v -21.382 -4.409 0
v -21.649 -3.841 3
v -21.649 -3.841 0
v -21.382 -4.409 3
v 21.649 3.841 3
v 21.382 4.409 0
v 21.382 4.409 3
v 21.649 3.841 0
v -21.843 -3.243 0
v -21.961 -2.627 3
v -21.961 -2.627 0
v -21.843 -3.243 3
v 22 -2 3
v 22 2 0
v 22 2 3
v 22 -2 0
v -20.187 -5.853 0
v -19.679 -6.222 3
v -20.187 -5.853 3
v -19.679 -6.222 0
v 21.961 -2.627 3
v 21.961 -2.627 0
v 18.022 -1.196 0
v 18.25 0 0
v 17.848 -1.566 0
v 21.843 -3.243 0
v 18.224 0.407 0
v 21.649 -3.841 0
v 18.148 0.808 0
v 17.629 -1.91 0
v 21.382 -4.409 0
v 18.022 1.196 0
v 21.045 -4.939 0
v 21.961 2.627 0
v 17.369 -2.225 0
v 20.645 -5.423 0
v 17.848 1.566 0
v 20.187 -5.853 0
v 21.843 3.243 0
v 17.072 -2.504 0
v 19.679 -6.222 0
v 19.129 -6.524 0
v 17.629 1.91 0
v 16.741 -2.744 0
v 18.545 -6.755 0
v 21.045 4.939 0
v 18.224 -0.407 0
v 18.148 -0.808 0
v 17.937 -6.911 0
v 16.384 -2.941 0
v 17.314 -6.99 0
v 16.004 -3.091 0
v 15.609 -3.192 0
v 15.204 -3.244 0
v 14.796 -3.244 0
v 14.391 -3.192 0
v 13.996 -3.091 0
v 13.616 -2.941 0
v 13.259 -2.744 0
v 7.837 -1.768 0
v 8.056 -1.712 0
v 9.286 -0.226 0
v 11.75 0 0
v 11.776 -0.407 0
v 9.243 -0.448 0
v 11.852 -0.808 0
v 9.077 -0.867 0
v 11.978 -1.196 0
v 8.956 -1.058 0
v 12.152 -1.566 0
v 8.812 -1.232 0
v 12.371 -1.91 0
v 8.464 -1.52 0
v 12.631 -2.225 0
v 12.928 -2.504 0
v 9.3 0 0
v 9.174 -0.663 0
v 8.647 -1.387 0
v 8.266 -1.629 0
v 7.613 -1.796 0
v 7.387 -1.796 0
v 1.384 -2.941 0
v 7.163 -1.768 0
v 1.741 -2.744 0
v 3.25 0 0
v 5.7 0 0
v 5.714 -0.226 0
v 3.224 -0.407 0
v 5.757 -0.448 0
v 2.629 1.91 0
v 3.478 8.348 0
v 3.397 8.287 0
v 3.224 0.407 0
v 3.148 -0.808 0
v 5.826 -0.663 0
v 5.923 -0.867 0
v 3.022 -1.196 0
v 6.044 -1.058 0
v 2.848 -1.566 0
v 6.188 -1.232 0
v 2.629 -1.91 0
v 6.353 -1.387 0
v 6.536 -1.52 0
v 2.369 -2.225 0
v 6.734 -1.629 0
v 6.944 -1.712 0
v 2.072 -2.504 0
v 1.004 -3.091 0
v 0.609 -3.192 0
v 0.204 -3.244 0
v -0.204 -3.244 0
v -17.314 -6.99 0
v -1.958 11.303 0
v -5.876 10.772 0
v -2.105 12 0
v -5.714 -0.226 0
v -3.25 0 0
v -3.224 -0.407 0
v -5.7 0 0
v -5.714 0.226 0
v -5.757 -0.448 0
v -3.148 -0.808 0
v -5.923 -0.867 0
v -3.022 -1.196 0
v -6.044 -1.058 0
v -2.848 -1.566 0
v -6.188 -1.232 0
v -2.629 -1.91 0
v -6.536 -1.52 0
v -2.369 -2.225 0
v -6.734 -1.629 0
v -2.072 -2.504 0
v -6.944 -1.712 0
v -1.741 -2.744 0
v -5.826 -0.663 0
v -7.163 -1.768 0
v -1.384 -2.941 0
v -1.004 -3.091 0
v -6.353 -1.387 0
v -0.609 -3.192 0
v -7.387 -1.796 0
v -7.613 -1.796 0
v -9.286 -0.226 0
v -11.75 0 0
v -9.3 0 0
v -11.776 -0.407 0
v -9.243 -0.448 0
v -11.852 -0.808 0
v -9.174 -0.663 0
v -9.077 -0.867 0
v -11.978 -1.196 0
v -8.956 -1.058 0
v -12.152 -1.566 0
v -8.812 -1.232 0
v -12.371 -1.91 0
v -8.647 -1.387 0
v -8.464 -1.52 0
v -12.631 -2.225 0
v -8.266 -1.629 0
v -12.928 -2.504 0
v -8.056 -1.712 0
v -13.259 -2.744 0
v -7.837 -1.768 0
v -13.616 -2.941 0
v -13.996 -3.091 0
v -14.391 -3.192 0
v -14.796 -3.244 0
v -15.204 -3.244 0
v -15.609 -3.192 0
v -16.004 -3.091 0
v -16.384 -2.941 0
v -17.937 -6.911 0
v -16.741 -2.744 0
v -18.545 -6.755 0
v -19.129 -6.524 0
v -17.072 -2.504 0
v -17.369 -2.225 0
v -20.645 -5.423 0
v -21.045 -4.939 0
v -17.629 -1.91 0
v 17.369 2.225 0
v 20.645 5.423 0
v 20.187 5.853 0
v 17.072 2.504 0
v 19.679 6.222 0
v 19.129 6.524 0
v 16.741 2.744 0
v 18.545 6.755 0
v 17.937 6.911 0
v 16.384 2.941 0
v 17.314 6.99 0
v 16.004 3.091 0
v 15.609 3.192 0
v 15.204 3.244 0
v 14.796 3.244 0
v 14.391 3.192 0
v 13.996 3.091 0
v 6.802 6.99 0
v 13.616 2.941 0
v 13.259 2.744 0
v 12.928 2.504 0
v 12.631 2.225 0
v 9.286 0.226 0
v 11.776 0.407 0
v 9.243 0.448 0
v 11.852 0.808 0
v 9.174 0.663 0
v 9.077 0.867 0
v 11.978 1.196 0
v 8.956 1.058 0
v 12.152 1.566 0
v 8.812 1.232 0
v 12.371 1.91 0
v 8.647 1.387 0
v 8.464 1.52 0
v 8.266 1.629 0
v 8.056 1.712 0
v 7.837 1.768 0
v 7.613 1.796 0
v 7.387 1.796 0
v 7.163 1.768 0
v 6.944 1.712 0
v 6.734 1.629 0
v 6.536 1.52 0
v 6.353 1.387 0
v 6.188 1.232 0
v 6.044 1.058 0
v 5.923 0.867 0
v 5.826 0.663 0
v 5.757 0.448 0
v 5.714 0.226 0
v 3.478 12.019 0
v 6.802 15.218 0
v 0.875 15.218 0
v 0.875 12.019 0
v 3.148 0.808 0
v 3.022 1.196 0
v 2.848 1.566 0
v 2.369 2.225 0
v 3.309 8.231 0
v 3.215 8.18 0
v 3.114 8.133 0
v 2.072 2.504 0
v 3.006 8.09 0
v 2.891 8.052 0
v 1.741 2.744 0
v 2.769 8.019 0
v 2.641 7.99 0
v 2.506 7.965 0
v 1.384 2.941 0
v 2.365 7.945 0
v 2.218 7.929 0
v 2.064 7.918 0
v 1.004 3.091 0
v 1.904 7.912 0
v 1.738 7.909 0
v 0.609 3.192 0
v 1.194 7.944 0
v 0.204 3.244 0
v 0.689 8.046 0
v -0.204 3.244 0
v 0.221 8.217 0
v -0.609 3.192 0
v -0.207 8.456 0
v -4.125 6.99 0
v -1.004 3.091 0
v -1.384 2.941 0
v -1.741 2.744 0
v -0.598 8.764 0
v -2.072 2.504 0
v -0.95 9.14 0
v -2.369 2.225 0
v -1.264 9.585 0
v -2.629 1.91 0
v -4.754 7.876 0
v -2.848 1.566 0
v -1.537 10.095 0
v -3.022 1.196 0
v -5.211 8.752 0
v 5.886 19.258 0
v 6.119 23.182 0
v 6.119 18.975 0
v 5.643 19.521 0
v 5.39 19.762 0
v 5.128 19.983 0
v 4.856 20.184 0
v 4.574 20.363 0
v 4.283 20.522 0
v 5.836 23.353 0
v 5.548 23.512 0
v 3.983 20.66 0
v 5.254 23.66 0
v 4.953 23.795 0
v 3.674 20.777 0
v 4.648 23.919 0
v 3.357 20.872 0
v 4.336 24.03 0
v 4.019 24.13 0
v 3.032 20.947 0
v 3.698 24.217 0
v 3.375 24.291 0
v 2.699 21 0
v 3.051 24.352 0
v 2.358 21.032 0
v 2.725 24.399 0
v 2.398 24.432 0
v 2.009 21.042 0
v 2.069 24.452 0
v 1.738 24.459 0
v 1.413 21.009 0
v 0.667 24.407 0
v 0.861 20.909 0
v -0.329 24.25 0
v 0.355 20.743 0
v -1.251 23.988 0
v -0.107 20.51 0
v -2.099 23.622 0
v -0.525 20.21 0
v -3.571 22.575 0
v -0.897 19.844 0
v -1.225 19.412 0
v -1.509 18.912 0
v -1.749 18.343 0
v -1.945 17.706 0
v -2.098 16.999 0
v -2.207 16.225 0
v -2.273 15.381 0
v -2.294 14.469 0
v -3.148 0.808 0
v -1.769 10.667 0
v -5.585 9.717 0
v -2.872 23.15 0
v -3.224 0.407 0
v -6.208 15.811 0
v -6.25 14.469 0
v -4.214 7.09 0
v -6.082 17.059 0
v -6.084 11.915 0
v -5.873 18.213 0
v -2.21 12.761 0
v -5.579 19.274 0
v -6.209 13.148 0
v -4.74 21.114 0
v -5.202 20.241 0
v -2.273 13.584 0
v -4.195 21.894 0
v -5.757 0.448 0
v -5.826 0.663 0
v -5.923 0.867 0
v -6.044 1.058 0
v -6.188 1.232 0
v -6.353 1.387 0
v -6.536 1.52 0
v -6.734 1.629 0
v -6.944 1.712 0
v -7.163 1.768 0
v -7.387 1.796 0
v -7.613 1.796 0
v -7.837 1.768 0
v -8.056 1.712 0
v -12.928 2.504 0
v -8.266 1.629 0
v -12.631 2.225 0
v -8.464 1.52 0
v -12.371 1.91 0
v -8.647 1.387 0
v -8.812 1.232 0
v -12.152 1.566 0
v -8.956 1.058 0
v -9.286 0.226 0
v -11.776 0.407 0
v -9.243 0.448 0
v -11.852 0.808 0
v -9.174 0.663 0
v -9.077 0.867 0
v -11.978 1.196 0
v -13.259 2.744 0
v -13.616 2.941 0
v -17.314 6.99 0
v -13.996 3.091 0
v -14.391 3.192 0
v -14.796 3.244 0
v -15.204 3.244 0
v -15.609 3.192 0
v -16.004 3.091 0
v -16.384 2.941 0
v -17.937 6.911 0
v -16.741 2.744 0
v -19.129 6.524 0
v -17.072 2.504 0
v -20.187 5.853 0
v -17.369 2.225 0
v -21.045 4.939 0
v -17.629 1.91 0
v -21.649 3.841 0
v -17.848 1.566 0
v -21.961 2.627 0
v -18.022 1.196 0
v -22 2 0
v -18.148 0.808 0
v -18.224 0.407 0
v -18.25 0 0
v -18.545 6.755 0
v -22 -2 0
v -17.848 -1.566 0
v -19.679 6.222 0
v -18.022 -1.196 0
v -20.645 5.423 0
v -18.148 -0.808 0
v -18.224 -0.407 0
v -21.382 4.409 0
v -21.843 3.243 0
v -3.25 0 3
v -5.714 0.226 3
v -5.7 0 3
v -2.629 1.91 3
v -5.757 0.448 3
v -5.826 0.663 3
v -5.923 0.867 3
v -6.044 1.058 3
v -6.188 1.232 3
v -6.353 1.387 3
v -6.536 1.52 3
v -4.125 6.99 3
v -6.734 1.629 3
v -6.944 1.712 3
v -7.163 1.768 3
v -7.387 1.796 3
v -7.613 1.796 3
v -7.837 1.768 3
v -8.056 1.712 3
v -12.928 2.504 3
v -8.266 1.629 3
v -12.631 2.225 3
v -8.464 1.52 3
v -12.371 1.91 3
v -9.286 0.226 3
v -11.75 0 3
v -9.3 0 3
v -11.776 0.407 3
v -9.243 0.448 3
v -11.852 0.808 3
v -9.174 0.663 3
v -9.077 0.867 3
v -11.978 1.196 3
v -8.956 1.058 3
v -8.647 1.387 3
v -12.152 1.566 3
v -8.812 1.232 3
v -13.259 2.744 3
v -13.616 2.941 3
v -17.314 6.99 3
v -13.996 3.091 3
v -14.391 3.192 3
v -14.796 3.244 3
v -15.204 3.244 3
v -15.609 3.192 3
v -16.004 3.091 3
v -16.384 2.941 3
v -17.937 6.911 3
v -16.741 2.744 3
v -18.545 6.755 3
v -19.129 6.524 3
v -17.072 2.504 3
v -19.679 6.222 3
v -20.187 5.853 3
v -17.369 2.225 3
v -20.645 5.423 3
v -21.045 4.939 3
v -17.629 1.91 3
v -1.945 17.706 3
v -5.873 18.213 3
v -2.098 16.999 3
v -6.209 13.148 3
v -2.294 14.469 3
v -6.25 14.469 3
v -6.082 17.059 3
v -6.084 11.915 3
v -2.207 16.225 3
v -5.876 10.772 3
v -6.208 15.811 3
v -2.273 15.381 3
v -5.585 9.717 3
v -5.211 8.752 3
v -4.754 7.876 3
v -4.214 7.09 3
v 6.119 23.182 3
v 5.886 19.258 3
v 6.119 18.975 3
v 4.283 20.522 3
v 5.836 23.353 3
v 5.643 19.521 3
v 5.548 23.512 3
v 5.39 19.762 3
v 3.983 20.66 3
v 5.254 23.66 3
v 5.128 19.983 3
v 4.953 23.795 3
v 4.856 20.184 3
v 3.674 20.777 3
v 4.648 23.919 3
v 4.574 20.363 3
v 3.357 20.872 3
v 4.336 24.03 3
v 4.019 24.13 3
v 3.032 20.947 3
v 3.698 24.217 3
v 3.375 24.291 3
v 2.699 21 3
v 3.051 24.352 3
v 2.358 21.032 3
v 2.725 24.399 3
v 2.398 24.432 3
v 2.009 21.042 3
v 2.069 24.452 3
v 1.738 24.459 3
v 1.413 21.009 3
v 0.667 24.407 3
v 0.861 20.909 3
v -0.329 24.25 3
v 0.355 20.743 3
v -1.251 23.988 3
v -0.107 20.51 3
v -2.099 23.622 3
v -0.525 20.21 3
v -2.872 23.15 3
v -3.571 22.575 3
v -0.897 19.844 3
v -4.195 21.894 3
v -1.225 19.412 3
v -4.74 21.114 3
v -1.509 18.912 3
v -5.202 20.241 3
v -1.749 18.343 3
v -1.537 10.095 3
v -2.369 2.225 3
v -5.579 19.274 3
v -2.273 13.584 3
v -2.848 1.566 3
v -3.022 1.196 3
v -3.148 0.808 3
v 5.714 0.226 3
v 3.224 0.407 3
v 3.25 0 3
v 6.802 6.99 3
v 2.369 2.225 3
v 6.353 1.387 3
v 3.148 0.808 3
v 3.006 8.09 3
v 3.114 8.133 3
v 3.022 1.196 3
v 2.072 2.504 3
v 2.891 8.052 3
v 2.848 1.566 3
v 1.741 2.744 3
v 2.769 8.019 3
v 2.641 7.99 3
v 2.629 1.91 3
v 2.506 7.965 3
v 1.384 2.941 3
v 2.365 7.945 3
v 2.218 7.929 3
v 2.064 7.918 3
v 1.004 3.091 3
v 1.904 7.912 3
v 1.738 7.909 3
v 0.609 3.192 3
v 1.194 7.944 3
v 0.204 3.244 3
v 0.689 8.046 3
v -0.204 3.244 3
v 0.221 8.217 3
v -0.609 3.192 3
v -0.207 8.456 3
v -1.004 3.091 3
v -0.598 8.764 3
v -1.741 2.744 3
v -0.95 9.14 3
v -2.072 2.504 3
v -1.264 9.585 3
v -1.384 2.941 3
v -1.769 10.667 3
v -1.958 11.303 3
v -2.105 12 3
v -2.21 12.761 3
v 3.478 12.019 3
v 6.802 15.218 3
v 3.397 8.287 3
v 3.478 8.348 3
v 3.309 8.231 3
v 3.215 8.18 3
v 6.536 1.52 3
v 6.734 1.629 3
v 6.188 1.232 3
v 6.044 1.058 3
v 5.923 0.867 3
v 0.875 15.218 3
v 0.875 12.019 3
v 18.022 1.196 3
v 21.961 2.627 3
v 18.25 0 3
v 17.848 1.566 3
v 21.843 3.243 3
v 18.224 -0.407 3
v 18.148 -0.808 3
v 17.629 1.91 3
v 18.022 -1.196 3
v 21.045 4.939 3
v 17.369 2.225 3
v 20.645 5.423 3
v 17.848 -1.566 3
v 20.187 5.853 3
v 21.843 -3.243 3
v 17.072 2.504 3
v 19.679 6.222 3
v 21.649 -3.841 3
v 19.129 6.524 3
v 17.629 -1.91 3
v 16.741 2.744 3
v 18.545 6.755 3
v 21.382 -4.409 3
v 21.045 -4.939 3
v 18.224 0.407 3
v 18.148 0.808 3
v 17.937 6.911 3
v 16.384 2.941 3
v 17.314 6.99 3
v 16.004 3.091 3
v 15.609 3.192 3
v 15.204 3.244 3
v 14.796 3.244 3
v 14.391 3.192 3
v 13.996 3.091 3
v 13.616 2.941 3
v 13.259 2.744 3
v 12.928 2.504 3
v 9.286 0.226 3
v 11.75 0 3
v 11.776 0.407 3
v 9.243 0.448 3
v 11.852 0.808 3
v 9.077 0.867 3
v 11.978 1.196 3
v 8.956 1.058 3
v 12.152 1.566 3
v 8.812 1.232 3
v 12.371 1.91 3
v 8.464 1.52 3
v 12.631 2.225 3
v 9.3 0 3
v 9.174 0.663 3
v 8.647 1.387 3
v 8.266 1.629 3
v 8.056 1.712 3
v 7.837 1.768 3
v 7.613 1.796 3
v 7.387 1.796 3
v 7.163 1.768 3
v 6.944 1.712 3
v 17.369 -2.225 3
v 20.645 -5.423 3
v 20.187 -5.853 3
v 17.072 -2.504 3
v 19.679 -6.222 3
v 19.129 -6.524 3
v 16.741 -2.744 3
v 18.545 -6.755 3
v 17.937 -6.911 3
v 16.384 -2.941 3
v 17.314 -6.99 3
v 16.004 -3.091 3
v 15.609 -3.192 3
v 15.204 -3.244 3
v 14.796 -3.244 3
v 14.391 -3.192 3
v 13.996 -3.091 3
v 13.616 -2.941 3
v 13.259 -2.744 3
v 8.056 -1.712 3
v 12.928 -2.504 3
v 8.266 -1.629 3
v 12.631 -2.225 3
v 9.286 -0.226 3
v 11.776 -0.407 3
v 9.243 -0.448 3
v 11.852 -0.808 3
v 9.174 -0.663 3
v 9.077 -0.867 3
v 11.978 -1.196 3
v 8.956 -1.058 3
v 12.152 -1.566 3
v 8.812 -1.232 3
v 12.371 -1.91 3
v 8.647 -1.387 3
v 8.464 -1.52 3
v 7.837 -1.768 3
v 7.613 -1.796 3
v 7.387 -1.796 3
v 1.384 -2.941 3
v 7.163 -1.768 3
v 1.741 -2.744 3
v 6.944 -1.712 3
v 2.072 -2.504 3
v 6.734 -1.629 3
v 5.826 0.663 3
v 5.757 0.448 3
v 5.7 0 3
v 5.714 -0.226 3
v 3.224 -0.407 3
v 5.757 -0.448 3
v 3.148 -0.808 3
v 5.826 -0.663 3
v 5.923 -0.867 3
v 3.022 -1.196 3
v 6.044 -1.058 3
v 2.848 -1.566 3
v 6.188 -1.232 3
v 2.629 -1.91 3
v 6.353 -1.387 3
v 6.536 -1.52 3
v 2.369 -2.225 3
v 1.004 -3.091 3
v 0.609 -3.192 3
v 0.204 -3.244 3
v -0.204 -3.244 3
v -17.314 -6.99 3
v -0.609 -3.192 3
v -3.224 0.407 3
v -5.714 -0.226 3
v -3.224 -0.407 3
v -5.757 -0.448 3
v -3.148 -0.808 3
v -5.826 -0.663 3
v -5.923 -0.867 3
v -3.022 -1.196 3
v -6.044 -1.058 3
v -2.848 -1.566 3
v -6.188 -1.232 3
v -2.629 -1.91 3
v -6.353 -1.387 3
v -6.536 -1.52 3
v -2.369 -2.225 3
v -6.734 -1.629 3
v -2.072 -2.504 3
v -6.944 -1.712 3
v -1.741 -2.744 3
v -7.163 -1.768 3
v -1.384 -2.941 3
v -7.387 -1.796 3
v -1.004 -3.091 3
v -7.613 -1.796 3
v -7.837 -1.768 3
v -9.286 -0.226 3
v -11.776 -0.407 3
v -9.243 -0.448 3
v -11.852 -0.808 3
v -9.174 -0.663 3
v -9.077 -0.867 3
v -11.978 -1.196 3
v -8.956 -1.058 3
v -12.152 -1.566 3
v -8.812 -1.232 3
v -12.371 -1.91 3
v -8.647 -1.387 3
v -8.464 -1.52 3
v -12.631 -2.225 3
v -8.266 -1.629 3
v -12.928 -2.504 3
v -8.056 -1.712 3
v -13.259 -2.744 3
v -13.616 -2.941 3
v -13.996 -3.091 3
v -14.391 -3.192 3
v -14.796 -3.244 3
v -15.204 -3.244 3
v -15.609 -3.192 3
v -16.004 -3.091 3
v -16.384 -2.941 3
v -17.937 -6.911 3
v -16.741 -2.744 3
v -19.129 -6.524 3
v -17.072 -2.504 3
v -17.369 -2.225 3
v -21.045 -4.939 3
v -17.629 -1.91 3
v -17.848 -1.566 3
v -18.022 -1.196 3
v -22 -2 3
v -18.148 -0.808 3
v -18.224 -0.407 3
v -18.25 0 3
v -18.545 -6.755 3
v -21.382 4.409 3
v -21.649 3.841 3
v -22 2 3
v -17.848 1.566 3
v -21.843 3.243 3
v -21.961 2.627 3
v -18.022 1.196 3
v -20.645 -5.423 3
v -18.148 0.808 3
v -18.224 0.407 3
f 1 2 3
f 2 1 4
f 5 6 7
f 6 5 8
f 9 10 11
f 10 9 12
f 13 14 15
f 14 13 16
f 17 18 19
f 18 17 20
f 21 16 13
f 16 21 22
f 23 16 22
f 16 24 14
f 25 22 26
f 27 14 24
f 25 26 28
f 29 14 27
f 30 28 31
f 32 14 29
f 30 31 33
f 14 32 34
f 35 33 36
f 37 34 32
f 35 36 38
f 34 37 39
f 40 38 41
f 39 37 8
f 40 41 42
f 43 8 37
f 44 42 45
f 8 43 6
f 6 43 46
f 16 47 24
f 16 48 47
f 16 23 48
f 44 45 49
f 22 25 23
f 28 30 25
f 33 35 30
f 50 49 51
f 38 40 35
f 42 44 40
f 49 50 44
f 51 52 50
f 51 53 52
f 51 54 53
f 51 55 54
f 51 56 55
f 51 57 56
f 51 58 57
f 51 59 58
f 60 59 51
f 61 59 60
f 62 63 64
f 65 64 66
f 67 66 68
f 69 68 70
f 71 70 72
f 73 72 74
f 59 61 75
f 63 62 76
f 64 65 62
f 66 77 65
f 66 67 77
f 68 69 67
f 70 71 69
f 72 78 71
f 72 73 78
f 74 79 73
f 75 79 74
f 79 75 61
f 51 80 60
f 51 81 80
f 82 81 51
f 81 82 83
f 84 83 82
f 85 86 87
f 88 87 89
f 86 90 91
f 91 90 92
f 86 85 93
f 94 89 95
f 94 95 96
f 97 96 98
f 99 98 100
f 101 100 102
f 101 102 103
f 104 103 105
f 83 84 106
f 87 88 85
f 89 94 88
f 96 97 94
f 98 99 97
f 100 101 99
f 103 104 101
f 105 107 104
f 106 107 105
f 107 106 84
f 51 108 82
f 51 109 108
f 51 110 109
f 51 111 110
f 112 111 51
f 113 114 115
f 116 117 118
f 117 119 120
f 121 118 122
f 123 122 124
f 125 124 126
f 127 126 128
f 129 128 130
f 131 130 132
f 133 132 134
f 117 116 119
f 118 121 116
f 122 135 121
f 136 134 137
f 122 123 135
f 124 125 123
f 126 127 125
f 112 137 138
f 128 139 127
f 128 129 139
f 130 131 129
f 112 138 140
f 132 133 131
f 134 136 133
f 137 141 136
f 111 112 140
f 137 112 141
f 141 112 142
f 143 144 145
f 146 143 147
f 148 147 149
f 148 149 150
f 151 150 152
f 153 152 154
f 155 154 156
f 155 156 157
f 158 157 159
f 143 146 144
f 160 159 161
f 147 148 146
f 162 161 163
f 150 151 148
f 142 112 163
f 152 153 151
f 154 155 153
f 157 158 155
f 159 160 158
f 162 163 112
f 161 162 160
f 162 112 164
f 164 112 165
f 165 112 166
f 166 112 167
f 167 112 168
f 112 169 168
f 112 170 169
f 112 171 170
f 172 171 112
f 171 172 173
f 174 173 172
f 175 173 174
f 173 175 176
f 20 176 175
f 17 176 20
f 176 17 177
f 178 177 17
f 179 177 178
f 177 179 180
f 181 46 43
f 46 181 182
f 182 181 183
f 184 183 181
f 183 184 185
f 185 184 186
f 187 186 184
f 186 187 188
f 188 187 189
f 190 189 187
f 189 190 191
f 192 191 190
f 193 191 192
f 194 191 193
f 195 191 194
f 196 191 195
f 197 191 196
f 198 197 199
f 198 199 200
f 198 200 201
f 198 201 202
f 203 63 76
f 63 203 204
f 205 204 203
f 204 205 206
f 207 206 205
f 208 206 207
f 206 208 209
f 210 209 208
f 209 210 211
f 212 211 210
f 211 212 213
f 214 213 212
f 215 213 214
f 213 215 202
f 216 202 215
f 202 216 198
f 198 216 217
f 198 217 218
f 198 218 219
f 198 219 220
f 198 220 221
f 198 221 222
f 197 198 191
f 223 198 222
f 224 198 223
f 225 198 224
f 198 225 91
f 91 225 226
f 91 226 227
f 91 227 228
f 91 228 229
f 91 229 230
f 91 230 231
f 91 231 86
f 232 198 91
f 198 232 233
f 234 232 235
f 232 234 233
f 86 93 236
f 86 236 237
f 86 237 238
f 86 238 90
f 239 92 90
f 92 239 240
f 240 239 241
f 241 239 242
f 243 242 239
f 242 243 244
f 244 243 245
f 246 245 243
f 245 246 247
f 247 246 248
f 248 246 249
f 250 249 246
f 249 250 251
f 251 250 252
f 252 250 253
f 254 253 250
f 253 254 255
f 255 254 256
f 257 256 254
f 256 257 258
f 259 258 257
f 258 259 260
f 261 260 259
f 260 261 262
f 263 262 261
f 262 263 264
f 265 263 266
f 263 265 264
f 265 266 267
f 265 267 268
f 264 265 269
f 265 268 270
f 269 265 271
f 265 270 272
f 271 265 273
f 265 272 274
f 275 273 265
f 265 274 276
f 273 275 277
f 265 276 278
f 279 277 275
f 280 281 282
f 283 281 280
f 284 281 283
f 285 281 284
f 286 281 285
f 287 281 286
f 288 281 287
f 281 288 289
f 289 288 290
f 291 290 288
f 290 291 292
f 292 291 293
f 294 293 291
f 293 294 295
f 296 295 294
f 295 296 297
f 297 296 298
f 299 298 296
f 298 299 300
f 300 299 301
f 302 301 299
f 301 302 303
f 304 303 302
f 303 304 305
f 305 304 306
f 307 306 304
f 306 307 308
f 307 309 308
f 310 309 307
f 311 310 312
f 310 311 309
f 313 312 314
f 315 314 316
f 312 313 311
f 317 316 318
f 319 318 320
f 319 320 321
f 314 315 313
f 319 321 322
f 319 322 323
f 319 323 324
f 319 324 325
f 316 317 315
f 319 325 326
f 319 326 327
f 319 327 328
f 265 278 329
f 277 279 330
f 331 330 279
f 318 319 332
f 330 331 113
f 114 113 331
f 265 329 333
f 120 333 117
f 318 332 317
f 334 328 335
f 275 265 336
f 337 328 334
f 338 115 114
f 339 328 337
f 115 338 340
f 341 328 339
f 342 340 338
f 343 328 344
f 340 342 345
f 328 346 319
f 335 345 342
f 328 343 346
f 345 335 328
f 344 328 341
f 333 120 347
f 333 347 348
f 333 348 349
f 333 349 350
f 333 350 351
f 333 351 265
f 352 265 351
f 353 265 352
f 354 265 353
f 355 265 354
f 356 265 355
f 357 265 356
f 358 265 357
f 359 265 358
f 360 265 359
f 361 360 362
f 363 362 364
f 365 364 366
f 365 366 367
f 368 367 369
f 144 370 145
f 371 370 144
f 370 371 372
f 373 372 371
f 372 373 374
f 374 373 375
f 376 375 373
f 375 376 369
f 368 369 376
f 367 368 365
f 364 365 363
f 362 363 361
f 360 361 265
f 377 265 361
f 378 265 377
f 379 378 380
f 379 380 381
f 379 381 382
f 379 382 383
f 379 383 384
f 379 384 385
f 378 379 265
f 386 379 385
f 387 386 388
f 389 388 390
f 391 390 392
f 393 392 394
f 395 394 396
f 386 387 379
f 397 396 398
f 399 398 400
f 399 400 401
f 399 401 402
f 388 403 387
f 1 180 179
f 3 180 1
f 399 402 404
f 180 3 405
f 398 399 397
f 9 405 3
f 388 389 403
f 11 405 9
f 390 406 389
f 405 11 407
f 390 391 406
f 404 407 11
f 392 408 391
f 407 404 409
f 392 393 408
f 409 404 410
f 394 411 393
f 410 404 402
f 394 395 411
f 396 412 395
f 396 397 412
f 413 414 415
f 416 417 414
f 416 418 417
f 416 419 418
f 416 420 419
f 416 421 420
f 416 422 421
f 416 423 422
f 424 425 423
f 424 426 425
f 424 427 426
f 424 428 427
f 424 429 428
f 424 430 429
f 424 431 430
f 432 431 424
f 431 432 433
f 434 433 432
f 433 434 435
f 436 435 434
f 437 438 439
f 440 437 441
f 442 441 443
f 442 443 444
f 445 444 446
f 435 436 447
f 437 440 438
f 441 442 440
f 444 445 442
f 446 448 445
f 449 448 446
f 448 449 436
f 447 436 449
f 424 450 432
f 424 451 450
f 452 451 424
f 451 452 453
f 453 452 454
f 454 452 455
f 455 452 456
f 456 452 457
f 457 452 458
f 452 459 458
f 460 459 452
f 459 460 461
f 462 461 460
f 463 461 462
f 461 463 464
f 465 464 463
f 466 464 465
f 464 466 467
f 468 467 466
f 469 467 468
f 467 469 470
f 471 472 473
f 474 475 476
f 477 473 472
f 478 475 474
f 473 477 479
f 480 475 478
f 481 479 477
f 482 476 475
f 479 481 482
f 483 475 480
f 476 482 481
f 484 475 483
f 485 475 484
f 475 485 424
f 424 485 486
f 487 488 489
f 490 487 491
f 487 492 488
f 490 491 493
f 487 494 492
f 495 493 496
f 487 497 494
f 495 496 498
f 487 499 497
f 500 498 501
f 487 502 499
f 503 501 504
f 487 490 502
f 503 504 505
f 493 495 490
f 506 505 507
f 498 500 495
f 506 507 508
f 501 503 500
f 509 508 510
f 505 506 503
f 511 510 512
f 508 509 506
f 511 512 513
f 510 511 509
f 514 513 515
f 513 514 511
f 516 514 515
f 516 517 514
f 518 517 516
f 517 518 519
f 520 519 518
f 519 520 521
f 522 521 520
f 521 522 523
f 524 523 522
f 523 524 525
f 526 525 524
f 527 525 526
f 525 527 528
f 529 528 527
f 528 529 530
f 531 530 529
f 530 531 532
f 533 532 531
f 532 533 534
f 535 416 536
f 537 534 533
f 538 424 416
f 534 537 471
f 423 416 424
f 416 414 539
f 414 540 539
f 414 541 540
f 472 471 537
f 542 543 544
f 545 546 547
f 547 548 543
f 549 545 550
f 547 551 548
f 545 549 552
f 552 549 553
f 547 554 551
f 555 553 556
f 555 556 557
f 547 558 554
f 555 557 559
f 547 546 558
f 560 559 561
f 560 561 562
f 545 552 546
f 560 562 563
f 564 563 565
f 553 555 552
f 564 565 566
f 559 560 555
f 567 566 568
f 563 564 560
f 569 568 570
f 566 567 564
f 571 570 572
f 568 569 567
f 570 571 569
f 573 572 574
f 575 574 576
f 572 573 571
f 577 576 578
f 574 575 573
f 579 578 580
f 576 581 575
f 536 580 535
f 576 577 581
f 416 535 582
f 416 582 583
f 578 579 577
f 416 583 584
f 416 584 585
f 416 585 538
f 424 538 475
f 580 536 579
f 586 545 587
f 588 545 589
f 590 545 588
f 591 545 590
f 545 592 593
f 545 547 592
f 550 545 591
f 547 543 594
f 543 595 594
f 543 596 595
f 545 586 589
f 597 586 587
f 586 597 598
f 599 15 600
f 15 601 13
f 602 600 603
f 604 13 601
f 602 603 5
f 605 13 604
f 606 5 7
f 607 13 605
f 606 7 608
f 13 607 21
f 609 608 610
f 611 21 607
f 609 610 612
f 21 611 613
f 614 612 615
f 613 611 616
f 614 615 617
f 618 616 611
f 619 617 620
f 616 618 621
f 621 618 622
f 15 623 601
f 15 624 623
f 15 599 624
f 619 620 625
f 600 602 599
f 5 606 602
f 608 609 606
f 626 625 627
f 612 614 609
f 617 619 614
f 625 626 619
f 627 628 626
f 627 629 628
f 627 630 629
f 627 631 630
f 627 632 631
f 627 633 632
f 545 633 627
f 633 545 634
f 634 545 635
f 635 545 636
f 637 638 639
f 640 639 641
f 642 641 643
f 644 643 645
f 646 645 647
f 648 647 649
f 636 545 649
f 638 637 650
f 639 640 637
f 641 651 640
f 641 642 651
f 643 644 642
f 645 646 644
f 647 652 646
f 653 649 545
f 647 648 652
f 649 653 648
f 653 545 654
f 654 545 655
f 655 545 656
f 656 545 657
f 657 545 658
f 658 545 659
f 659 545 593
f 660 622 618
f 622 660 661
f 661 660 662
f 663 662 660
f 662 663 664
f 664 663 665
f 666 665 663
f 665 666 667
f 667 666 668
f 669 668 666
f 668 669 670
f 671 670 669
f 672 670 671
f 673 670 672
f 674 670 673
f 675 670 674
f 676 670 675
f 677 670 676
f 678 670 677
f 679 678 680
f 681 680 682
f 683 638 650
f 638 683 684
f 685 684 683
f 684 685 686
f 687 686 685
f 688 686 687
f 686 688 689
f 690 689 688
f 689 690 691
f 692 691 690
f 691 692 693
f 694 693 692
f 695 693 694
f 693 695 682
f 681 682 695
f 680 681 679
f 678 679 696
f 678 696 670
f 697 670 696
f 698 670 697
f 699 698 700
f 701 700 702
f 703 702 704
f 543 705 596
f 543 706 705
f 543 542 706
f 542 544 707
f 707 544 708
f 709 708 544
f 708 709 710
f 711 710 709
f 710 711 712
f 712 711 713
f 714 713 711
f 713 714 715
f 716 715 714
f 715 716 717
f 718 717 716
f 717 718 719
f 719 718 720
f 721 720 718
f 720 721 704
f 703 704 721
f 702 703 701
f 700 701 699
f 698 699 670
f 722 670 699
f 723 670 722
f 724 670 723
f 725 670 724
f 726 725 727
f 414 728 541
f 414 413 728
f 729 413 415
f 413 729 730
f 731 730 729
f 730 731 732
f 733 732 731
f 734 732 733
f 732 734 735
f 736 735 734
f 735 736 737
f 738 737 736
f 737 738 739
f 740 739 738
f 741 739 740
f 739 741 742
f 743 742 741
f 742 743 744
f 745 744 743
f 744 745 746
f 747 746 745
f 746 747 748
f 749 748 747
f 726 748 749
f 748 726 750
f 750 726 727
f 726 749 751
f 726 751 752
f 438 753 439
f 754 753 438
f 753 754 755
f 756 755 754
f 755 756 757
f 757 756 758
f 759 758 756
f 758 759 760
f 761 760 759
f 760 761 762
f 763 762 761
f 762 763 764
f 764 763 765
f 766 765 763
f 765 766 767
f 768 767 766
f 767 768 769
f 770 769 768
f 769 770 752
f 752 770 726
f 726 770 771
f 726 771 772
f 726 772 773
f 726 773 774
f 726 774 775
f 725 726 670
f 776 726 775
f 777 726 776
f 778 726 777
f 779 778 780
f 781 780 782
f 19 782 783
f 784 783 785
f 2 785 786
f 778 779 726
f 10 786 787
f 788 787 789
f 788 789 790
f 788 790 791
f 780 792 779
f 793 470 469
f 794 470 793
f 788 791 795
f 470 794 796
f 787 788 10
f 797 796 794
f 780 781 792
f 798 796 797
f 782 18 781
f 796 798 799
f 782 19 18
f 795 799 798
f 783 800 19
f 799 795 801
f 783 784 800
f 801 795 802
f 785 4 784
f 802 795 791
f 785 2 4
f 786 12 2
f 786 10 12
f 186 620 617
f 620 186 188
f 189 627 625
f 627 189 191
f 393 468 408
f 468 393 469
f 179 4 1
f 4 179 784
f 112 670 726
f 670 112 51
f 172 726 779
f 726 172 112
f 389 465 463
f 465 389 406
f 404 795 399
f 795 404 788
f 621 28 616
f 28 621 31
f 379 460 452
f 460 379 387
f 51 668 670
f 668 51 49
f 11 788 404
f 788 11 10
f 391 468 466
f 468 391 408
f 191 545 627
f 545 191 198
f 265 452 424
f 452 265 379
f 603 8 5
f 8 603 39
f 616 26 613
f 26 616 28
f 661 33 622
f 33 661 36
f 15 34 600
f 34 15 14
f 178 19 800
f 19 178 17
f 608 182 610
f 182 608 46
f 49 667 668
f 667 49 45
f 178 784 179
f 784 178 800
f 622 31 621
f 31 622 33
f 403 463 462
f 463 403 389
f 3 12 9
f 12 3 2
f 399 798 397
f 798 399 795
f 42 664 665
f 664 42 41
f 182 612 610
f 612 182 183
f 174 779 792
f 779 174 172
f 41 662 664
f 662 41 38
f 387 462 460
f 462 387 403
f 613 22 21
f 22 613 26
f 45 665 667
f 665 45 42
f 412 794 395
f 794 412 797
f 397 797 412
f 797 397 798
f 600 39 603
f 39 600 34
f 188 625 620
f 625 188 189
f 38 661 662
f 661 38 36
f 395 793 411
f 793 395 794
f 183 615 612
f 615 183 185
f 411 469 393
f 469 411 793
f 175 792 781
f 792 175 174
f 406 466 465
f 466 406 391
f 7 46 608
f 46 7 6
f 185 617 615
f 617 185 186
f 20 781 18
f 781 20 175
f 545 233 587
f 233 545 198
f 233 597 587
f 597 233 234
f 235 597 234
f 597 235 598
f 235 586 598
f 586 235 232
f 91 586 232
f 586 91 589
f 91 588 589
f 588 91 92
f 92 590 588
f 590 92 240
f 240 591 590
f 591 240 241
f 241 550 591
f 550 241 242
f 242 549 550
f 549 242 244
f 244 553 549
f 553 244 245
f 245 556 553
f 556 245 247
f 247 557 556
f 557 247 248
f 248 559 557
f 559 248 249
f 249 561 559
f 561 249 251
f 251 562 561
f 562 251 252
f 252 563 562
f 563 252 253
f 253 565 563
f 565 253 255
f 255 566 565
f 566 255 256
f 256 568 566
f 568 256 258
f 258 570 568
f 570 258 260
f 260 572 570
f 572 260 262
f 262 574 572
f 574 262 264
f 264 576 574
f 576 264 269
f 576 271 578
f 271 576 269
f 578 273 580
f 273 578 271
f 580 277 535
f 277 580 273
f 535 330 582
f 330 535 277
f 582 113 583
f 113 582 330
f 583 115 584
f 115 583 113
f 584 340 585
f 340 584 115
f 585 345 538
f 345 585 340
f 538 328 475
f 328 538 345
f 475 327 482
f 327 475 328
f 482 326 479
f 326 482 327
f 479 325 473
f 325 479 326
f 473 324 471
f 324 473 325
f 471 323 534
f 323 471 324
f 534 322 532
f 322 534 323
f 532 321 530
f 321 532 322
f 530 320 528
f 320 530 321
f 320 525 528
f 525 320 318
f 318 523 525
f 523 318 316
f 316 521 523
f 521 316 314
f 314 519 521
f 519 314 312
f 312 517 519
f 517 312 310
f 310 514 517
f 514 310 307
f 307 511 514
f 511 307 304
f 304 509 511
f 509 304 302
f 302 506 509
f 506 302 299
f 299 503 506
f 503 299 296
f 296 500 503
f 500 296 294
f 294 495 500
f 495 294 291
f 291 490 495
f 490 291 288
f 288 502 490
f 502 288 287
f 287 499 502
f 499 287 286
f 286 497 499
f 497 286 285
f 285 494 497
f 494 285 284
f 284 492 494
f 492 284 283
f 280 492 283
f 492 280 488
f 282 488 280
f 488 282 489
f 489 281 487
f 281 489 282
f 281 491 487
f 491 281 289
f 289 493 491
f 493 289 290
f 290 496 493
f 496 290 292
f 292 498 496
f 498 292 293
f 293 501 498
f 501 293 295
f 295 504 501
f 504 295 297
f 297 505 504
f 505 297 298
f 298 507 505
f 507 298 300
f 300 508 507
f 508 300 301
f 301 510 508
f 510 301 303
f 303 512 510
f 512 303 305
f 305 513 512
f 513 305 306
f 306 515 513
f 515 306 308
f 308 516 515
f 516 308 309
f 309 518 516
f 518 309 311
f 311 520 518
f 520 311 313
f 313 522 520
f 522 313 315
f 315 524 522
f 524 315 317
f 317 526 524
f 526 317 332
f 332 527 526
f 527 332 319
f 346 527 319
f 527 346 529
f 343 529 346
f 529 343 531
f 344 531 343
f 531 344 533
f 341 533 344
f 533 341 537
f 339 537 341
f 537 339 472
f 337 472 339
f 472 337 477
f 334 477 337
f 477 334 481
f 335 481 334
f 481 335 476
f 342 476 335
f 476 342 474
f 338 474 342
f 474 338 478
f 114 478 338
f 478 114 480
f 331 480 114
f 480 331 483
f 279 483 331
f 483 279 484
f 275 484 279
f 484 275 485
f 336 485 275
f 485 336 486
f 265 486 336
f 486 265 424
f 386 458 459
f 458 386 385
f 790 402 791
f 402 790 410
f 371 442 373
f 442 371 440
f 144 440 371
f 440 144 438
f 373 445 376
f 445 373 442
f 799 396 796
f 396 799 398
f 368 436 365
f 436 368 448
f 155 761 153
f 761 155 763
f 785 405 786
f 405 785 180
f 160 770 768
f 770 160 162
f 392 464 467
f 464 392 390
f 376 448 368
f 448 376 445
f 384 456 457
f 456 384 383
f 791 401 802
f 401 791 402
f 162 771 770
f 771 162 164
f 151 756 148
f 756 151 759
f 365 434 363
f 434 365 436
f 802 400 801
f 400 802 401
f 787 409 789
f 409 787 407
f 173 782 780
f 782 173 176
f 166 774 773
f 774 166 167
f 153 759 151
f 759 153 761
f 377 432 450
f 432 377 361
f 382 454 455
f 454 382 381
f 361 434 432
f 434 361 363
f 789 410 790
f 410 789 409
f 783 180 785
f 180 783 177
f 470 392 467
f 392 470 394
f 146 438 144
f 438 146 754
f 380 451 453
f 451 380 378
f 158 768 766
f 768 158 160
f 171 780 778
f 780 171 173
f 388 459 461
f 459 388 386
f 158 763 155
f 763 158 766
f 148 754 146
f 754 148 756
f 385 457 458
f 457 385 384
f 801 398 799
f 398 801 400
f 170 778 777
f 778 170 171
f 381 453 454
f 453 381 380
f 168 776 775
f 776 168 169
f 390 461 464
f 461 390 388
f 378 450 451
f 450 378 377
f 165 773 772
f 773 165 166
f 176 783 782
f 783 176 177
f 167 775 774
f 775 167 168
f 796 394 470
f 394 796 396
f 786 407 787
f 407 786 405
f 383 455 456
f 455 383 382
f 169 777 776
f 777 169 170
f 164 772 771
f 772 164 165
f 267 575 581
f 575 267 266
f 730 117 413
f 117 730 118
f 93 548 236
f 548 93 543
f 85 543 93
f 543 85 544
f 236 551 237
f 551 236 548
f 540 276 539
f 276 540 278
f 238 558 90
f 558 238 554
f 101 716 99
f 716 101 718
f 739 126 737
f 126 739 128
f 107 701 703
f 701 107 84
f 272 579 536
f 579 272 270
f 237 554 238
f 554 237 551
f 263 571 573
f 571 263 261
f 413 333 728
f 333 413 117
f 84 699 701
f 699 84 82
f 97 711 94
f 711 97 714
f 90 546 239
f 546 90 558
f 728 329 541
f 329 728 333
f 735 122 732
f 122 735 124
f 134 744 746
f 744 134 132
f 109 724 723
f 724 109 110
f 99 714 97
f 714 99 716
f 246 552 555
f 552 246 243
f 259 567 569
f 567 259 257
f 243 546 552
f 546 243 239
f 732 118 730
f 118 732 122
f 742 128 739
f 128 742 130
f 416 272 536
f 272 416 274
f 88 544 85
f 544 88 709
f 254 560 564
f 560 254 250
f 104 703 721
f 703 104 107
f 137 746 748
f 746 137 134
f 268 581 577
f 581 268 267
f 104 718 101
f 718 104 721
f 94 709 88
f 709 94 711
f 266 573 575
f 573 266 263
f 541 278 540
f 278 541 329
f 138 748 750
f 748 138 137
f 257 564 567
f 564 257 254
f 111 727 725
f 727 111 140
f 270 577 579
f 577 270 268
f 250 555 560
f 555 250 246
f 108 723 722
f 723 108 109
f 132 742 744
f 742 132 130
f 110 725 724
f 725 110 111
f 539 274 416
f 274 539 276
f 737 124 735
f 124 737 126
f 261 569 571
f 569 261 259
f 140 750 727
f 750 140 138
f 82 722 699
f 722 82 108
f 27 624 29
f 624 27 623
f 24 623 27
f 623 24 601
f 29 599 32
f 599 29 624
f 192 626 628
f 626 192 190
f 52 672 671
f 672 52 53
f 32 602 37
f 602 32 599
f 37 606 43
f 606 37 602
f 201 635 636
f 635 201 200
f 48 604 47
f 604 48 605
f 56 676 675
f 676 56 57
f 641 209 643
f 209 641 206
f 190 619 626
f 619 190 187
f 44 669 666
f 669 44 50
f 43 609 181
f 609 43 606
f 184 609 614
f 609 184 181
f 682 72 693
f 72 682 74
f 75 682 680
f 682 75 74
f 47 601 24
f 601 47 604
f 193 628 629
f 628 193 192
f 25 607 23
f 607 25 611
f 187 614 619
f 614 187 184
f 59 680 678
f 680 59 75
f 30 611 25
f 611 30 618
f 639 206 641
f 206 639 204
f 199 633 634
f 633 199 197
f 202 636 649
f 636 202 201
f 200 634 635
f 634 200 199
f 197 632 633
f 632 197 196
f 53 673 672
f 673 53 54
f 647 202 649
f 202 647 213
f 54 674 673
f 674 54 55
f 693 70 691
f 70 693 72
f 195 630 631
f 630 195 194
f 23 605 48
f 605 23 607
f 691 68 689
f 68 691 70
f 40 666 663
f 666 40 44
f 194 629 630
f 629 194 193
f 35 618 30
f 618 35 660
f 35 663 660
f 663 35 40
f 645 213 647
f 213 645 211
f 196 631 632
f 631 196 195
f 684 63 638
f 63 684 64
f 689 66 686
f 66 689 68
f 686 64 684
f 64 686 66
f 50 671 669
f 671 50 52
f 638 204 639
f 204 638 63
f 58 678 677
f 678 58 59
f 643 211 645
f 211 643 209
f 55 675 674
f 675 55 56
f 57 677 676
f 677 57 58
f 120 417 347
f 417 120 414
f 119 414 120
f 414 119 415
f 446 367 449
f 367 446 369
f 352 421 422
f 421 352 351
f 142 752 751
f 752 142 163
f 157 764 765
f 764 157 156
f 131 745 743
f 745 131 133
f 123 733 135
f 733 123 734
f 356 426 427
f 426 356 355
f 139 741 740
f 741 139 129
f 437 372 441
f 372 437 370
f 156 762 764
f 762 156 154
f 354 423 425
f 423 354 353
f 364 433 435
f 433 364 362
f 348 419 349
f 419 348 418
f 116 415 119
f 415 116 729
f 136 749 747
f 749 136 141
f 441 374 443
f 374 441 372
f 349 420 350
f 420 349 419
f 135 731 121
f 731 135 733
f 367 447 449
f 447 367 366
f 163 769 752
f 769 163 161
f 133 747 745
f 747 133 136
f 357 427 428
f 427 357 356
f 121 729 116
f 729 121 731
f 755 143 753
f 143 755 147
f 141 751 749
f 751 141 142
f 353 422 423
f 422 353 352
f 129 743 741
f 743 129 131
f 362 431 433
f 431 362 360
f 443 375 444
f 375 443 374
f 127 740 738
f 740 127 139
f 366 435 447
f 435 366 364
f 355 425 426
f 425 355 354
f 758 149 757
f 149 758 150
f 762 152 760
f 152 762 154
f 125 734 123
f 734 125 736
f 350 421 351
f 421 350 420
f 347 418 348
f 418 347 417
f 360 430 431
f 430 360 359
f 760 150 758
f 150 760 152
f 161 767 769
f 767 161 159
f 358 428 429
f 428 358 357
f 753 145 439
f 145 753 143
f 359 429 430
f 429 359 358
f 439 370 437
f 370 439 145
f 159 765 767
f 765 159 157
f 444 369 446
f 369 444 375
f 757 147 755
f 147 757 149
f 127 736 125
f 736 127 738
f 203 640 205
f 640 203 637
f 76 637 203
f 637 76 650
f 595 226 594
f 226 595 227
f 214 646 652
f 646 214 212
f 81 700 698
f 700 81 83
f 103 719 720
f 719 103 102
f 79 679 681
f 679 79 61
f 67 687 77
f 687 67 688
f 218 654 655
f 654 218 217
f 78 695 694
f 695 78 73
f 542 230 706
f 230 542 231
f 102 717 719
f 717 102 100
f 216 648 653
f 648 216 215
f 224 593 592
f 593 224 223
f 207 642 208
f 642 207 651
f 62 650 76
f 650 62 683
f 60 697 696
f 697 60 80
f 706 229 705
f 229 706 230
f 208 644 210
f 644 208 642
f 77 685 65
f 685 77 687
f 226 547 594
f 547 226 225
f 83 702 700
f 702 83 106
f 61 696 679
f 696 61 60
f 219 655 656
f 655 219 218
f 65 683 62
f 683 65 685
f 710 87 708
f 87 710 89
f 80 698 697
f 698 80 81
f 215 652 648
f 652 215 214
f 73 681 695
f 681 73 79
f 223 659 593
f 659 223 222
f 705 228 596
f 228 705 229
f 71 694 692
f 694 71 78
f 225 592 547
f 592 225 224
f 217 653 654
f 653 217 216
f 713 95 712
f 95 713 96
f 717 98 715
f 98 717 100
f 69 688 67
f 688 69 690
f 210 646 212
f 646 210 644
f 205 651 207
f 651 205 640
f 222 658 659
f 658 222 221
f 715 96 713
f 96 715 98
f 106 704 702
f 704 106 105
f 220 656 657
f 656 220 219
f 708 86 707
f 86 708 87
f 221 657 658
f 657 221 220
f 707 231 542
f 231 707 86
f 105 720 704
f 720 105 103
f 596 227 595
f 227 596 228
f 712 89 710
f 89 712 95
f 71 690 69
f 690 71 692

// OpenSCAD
$fn = 50;


difference() {
	union() {
		hull() {
			translate(v = [-17.0000000000, 2.0000000000, 0]) {
				cylinder(h = 3, r = 5);
			}
			translate(v = [17.0000000000, 2.0000000000, 0]) {
				cylinder(h = 3, r = 5);
			}
			translate(v = [-17.0000000000, -2.0000000000, 0]) {
				cylinder(h = 3, r = 5);
			}
			translate(v = [17.0000000000, -2.0000000000, 0]) {
				cylinder(h = 3, r = 5);
			}
		}
		translate(v = [0, 24, 0]) {
			linear_extrude(height = 3) {
				text(font = "DejaVu Sans Mono:style=Bold", halign = "center", size = 19.0000000000, text = "G", valign = "top");
			}
		}
	}
	union() {
		translate(v = [-15.0000000000, 0.0000000000, 0]) {
			translate(v = [0, 0, -100]) {
				cylinder(h = 200, r = 3.2500000000);
			}
		}
		translate(v = [0, 0, -100]) {
			cylinder(h = 200, r = 3.2500000000);
		}
		translate(v = [15.0000000000, 0.0000000000, 0]) {
			translate(v = [0, 0, -100]) {
				cylinder(h = 200, r = 3.2500000000);
			}
		}
		translate(v = [-15.0000000000, 0.0000000000, 0]) {
			translate(v = [0, 0, -100]) {
				cylinder(h = 200, r = 1.8000000000);
			}
		}
		translate(v = [-7.5000000000, 0.0000000000, 0]) {
			translate(v = [0, 0, -100]) {
				cylinder(h = 200, r = 1.8000000000);
			}
		}
		translate(v = [0, 0, -100]) {
			cylinder(h = 200, r = 1.8000000000);
		}
		translate(v = [7.5000000000, 0.0000000000, 0]) {
			translate(v = [0, 0, -100]) {
				cylinder(h = 200, r = 1.8000000000);
			}
		}
		translate(v = [15.0000000000, 0.0000000000, 0]) {
			translate(v = [0, 0, -100]) {
				cylinder(h = 200, r = 1.8000000000);
			}
		}
	}
}
